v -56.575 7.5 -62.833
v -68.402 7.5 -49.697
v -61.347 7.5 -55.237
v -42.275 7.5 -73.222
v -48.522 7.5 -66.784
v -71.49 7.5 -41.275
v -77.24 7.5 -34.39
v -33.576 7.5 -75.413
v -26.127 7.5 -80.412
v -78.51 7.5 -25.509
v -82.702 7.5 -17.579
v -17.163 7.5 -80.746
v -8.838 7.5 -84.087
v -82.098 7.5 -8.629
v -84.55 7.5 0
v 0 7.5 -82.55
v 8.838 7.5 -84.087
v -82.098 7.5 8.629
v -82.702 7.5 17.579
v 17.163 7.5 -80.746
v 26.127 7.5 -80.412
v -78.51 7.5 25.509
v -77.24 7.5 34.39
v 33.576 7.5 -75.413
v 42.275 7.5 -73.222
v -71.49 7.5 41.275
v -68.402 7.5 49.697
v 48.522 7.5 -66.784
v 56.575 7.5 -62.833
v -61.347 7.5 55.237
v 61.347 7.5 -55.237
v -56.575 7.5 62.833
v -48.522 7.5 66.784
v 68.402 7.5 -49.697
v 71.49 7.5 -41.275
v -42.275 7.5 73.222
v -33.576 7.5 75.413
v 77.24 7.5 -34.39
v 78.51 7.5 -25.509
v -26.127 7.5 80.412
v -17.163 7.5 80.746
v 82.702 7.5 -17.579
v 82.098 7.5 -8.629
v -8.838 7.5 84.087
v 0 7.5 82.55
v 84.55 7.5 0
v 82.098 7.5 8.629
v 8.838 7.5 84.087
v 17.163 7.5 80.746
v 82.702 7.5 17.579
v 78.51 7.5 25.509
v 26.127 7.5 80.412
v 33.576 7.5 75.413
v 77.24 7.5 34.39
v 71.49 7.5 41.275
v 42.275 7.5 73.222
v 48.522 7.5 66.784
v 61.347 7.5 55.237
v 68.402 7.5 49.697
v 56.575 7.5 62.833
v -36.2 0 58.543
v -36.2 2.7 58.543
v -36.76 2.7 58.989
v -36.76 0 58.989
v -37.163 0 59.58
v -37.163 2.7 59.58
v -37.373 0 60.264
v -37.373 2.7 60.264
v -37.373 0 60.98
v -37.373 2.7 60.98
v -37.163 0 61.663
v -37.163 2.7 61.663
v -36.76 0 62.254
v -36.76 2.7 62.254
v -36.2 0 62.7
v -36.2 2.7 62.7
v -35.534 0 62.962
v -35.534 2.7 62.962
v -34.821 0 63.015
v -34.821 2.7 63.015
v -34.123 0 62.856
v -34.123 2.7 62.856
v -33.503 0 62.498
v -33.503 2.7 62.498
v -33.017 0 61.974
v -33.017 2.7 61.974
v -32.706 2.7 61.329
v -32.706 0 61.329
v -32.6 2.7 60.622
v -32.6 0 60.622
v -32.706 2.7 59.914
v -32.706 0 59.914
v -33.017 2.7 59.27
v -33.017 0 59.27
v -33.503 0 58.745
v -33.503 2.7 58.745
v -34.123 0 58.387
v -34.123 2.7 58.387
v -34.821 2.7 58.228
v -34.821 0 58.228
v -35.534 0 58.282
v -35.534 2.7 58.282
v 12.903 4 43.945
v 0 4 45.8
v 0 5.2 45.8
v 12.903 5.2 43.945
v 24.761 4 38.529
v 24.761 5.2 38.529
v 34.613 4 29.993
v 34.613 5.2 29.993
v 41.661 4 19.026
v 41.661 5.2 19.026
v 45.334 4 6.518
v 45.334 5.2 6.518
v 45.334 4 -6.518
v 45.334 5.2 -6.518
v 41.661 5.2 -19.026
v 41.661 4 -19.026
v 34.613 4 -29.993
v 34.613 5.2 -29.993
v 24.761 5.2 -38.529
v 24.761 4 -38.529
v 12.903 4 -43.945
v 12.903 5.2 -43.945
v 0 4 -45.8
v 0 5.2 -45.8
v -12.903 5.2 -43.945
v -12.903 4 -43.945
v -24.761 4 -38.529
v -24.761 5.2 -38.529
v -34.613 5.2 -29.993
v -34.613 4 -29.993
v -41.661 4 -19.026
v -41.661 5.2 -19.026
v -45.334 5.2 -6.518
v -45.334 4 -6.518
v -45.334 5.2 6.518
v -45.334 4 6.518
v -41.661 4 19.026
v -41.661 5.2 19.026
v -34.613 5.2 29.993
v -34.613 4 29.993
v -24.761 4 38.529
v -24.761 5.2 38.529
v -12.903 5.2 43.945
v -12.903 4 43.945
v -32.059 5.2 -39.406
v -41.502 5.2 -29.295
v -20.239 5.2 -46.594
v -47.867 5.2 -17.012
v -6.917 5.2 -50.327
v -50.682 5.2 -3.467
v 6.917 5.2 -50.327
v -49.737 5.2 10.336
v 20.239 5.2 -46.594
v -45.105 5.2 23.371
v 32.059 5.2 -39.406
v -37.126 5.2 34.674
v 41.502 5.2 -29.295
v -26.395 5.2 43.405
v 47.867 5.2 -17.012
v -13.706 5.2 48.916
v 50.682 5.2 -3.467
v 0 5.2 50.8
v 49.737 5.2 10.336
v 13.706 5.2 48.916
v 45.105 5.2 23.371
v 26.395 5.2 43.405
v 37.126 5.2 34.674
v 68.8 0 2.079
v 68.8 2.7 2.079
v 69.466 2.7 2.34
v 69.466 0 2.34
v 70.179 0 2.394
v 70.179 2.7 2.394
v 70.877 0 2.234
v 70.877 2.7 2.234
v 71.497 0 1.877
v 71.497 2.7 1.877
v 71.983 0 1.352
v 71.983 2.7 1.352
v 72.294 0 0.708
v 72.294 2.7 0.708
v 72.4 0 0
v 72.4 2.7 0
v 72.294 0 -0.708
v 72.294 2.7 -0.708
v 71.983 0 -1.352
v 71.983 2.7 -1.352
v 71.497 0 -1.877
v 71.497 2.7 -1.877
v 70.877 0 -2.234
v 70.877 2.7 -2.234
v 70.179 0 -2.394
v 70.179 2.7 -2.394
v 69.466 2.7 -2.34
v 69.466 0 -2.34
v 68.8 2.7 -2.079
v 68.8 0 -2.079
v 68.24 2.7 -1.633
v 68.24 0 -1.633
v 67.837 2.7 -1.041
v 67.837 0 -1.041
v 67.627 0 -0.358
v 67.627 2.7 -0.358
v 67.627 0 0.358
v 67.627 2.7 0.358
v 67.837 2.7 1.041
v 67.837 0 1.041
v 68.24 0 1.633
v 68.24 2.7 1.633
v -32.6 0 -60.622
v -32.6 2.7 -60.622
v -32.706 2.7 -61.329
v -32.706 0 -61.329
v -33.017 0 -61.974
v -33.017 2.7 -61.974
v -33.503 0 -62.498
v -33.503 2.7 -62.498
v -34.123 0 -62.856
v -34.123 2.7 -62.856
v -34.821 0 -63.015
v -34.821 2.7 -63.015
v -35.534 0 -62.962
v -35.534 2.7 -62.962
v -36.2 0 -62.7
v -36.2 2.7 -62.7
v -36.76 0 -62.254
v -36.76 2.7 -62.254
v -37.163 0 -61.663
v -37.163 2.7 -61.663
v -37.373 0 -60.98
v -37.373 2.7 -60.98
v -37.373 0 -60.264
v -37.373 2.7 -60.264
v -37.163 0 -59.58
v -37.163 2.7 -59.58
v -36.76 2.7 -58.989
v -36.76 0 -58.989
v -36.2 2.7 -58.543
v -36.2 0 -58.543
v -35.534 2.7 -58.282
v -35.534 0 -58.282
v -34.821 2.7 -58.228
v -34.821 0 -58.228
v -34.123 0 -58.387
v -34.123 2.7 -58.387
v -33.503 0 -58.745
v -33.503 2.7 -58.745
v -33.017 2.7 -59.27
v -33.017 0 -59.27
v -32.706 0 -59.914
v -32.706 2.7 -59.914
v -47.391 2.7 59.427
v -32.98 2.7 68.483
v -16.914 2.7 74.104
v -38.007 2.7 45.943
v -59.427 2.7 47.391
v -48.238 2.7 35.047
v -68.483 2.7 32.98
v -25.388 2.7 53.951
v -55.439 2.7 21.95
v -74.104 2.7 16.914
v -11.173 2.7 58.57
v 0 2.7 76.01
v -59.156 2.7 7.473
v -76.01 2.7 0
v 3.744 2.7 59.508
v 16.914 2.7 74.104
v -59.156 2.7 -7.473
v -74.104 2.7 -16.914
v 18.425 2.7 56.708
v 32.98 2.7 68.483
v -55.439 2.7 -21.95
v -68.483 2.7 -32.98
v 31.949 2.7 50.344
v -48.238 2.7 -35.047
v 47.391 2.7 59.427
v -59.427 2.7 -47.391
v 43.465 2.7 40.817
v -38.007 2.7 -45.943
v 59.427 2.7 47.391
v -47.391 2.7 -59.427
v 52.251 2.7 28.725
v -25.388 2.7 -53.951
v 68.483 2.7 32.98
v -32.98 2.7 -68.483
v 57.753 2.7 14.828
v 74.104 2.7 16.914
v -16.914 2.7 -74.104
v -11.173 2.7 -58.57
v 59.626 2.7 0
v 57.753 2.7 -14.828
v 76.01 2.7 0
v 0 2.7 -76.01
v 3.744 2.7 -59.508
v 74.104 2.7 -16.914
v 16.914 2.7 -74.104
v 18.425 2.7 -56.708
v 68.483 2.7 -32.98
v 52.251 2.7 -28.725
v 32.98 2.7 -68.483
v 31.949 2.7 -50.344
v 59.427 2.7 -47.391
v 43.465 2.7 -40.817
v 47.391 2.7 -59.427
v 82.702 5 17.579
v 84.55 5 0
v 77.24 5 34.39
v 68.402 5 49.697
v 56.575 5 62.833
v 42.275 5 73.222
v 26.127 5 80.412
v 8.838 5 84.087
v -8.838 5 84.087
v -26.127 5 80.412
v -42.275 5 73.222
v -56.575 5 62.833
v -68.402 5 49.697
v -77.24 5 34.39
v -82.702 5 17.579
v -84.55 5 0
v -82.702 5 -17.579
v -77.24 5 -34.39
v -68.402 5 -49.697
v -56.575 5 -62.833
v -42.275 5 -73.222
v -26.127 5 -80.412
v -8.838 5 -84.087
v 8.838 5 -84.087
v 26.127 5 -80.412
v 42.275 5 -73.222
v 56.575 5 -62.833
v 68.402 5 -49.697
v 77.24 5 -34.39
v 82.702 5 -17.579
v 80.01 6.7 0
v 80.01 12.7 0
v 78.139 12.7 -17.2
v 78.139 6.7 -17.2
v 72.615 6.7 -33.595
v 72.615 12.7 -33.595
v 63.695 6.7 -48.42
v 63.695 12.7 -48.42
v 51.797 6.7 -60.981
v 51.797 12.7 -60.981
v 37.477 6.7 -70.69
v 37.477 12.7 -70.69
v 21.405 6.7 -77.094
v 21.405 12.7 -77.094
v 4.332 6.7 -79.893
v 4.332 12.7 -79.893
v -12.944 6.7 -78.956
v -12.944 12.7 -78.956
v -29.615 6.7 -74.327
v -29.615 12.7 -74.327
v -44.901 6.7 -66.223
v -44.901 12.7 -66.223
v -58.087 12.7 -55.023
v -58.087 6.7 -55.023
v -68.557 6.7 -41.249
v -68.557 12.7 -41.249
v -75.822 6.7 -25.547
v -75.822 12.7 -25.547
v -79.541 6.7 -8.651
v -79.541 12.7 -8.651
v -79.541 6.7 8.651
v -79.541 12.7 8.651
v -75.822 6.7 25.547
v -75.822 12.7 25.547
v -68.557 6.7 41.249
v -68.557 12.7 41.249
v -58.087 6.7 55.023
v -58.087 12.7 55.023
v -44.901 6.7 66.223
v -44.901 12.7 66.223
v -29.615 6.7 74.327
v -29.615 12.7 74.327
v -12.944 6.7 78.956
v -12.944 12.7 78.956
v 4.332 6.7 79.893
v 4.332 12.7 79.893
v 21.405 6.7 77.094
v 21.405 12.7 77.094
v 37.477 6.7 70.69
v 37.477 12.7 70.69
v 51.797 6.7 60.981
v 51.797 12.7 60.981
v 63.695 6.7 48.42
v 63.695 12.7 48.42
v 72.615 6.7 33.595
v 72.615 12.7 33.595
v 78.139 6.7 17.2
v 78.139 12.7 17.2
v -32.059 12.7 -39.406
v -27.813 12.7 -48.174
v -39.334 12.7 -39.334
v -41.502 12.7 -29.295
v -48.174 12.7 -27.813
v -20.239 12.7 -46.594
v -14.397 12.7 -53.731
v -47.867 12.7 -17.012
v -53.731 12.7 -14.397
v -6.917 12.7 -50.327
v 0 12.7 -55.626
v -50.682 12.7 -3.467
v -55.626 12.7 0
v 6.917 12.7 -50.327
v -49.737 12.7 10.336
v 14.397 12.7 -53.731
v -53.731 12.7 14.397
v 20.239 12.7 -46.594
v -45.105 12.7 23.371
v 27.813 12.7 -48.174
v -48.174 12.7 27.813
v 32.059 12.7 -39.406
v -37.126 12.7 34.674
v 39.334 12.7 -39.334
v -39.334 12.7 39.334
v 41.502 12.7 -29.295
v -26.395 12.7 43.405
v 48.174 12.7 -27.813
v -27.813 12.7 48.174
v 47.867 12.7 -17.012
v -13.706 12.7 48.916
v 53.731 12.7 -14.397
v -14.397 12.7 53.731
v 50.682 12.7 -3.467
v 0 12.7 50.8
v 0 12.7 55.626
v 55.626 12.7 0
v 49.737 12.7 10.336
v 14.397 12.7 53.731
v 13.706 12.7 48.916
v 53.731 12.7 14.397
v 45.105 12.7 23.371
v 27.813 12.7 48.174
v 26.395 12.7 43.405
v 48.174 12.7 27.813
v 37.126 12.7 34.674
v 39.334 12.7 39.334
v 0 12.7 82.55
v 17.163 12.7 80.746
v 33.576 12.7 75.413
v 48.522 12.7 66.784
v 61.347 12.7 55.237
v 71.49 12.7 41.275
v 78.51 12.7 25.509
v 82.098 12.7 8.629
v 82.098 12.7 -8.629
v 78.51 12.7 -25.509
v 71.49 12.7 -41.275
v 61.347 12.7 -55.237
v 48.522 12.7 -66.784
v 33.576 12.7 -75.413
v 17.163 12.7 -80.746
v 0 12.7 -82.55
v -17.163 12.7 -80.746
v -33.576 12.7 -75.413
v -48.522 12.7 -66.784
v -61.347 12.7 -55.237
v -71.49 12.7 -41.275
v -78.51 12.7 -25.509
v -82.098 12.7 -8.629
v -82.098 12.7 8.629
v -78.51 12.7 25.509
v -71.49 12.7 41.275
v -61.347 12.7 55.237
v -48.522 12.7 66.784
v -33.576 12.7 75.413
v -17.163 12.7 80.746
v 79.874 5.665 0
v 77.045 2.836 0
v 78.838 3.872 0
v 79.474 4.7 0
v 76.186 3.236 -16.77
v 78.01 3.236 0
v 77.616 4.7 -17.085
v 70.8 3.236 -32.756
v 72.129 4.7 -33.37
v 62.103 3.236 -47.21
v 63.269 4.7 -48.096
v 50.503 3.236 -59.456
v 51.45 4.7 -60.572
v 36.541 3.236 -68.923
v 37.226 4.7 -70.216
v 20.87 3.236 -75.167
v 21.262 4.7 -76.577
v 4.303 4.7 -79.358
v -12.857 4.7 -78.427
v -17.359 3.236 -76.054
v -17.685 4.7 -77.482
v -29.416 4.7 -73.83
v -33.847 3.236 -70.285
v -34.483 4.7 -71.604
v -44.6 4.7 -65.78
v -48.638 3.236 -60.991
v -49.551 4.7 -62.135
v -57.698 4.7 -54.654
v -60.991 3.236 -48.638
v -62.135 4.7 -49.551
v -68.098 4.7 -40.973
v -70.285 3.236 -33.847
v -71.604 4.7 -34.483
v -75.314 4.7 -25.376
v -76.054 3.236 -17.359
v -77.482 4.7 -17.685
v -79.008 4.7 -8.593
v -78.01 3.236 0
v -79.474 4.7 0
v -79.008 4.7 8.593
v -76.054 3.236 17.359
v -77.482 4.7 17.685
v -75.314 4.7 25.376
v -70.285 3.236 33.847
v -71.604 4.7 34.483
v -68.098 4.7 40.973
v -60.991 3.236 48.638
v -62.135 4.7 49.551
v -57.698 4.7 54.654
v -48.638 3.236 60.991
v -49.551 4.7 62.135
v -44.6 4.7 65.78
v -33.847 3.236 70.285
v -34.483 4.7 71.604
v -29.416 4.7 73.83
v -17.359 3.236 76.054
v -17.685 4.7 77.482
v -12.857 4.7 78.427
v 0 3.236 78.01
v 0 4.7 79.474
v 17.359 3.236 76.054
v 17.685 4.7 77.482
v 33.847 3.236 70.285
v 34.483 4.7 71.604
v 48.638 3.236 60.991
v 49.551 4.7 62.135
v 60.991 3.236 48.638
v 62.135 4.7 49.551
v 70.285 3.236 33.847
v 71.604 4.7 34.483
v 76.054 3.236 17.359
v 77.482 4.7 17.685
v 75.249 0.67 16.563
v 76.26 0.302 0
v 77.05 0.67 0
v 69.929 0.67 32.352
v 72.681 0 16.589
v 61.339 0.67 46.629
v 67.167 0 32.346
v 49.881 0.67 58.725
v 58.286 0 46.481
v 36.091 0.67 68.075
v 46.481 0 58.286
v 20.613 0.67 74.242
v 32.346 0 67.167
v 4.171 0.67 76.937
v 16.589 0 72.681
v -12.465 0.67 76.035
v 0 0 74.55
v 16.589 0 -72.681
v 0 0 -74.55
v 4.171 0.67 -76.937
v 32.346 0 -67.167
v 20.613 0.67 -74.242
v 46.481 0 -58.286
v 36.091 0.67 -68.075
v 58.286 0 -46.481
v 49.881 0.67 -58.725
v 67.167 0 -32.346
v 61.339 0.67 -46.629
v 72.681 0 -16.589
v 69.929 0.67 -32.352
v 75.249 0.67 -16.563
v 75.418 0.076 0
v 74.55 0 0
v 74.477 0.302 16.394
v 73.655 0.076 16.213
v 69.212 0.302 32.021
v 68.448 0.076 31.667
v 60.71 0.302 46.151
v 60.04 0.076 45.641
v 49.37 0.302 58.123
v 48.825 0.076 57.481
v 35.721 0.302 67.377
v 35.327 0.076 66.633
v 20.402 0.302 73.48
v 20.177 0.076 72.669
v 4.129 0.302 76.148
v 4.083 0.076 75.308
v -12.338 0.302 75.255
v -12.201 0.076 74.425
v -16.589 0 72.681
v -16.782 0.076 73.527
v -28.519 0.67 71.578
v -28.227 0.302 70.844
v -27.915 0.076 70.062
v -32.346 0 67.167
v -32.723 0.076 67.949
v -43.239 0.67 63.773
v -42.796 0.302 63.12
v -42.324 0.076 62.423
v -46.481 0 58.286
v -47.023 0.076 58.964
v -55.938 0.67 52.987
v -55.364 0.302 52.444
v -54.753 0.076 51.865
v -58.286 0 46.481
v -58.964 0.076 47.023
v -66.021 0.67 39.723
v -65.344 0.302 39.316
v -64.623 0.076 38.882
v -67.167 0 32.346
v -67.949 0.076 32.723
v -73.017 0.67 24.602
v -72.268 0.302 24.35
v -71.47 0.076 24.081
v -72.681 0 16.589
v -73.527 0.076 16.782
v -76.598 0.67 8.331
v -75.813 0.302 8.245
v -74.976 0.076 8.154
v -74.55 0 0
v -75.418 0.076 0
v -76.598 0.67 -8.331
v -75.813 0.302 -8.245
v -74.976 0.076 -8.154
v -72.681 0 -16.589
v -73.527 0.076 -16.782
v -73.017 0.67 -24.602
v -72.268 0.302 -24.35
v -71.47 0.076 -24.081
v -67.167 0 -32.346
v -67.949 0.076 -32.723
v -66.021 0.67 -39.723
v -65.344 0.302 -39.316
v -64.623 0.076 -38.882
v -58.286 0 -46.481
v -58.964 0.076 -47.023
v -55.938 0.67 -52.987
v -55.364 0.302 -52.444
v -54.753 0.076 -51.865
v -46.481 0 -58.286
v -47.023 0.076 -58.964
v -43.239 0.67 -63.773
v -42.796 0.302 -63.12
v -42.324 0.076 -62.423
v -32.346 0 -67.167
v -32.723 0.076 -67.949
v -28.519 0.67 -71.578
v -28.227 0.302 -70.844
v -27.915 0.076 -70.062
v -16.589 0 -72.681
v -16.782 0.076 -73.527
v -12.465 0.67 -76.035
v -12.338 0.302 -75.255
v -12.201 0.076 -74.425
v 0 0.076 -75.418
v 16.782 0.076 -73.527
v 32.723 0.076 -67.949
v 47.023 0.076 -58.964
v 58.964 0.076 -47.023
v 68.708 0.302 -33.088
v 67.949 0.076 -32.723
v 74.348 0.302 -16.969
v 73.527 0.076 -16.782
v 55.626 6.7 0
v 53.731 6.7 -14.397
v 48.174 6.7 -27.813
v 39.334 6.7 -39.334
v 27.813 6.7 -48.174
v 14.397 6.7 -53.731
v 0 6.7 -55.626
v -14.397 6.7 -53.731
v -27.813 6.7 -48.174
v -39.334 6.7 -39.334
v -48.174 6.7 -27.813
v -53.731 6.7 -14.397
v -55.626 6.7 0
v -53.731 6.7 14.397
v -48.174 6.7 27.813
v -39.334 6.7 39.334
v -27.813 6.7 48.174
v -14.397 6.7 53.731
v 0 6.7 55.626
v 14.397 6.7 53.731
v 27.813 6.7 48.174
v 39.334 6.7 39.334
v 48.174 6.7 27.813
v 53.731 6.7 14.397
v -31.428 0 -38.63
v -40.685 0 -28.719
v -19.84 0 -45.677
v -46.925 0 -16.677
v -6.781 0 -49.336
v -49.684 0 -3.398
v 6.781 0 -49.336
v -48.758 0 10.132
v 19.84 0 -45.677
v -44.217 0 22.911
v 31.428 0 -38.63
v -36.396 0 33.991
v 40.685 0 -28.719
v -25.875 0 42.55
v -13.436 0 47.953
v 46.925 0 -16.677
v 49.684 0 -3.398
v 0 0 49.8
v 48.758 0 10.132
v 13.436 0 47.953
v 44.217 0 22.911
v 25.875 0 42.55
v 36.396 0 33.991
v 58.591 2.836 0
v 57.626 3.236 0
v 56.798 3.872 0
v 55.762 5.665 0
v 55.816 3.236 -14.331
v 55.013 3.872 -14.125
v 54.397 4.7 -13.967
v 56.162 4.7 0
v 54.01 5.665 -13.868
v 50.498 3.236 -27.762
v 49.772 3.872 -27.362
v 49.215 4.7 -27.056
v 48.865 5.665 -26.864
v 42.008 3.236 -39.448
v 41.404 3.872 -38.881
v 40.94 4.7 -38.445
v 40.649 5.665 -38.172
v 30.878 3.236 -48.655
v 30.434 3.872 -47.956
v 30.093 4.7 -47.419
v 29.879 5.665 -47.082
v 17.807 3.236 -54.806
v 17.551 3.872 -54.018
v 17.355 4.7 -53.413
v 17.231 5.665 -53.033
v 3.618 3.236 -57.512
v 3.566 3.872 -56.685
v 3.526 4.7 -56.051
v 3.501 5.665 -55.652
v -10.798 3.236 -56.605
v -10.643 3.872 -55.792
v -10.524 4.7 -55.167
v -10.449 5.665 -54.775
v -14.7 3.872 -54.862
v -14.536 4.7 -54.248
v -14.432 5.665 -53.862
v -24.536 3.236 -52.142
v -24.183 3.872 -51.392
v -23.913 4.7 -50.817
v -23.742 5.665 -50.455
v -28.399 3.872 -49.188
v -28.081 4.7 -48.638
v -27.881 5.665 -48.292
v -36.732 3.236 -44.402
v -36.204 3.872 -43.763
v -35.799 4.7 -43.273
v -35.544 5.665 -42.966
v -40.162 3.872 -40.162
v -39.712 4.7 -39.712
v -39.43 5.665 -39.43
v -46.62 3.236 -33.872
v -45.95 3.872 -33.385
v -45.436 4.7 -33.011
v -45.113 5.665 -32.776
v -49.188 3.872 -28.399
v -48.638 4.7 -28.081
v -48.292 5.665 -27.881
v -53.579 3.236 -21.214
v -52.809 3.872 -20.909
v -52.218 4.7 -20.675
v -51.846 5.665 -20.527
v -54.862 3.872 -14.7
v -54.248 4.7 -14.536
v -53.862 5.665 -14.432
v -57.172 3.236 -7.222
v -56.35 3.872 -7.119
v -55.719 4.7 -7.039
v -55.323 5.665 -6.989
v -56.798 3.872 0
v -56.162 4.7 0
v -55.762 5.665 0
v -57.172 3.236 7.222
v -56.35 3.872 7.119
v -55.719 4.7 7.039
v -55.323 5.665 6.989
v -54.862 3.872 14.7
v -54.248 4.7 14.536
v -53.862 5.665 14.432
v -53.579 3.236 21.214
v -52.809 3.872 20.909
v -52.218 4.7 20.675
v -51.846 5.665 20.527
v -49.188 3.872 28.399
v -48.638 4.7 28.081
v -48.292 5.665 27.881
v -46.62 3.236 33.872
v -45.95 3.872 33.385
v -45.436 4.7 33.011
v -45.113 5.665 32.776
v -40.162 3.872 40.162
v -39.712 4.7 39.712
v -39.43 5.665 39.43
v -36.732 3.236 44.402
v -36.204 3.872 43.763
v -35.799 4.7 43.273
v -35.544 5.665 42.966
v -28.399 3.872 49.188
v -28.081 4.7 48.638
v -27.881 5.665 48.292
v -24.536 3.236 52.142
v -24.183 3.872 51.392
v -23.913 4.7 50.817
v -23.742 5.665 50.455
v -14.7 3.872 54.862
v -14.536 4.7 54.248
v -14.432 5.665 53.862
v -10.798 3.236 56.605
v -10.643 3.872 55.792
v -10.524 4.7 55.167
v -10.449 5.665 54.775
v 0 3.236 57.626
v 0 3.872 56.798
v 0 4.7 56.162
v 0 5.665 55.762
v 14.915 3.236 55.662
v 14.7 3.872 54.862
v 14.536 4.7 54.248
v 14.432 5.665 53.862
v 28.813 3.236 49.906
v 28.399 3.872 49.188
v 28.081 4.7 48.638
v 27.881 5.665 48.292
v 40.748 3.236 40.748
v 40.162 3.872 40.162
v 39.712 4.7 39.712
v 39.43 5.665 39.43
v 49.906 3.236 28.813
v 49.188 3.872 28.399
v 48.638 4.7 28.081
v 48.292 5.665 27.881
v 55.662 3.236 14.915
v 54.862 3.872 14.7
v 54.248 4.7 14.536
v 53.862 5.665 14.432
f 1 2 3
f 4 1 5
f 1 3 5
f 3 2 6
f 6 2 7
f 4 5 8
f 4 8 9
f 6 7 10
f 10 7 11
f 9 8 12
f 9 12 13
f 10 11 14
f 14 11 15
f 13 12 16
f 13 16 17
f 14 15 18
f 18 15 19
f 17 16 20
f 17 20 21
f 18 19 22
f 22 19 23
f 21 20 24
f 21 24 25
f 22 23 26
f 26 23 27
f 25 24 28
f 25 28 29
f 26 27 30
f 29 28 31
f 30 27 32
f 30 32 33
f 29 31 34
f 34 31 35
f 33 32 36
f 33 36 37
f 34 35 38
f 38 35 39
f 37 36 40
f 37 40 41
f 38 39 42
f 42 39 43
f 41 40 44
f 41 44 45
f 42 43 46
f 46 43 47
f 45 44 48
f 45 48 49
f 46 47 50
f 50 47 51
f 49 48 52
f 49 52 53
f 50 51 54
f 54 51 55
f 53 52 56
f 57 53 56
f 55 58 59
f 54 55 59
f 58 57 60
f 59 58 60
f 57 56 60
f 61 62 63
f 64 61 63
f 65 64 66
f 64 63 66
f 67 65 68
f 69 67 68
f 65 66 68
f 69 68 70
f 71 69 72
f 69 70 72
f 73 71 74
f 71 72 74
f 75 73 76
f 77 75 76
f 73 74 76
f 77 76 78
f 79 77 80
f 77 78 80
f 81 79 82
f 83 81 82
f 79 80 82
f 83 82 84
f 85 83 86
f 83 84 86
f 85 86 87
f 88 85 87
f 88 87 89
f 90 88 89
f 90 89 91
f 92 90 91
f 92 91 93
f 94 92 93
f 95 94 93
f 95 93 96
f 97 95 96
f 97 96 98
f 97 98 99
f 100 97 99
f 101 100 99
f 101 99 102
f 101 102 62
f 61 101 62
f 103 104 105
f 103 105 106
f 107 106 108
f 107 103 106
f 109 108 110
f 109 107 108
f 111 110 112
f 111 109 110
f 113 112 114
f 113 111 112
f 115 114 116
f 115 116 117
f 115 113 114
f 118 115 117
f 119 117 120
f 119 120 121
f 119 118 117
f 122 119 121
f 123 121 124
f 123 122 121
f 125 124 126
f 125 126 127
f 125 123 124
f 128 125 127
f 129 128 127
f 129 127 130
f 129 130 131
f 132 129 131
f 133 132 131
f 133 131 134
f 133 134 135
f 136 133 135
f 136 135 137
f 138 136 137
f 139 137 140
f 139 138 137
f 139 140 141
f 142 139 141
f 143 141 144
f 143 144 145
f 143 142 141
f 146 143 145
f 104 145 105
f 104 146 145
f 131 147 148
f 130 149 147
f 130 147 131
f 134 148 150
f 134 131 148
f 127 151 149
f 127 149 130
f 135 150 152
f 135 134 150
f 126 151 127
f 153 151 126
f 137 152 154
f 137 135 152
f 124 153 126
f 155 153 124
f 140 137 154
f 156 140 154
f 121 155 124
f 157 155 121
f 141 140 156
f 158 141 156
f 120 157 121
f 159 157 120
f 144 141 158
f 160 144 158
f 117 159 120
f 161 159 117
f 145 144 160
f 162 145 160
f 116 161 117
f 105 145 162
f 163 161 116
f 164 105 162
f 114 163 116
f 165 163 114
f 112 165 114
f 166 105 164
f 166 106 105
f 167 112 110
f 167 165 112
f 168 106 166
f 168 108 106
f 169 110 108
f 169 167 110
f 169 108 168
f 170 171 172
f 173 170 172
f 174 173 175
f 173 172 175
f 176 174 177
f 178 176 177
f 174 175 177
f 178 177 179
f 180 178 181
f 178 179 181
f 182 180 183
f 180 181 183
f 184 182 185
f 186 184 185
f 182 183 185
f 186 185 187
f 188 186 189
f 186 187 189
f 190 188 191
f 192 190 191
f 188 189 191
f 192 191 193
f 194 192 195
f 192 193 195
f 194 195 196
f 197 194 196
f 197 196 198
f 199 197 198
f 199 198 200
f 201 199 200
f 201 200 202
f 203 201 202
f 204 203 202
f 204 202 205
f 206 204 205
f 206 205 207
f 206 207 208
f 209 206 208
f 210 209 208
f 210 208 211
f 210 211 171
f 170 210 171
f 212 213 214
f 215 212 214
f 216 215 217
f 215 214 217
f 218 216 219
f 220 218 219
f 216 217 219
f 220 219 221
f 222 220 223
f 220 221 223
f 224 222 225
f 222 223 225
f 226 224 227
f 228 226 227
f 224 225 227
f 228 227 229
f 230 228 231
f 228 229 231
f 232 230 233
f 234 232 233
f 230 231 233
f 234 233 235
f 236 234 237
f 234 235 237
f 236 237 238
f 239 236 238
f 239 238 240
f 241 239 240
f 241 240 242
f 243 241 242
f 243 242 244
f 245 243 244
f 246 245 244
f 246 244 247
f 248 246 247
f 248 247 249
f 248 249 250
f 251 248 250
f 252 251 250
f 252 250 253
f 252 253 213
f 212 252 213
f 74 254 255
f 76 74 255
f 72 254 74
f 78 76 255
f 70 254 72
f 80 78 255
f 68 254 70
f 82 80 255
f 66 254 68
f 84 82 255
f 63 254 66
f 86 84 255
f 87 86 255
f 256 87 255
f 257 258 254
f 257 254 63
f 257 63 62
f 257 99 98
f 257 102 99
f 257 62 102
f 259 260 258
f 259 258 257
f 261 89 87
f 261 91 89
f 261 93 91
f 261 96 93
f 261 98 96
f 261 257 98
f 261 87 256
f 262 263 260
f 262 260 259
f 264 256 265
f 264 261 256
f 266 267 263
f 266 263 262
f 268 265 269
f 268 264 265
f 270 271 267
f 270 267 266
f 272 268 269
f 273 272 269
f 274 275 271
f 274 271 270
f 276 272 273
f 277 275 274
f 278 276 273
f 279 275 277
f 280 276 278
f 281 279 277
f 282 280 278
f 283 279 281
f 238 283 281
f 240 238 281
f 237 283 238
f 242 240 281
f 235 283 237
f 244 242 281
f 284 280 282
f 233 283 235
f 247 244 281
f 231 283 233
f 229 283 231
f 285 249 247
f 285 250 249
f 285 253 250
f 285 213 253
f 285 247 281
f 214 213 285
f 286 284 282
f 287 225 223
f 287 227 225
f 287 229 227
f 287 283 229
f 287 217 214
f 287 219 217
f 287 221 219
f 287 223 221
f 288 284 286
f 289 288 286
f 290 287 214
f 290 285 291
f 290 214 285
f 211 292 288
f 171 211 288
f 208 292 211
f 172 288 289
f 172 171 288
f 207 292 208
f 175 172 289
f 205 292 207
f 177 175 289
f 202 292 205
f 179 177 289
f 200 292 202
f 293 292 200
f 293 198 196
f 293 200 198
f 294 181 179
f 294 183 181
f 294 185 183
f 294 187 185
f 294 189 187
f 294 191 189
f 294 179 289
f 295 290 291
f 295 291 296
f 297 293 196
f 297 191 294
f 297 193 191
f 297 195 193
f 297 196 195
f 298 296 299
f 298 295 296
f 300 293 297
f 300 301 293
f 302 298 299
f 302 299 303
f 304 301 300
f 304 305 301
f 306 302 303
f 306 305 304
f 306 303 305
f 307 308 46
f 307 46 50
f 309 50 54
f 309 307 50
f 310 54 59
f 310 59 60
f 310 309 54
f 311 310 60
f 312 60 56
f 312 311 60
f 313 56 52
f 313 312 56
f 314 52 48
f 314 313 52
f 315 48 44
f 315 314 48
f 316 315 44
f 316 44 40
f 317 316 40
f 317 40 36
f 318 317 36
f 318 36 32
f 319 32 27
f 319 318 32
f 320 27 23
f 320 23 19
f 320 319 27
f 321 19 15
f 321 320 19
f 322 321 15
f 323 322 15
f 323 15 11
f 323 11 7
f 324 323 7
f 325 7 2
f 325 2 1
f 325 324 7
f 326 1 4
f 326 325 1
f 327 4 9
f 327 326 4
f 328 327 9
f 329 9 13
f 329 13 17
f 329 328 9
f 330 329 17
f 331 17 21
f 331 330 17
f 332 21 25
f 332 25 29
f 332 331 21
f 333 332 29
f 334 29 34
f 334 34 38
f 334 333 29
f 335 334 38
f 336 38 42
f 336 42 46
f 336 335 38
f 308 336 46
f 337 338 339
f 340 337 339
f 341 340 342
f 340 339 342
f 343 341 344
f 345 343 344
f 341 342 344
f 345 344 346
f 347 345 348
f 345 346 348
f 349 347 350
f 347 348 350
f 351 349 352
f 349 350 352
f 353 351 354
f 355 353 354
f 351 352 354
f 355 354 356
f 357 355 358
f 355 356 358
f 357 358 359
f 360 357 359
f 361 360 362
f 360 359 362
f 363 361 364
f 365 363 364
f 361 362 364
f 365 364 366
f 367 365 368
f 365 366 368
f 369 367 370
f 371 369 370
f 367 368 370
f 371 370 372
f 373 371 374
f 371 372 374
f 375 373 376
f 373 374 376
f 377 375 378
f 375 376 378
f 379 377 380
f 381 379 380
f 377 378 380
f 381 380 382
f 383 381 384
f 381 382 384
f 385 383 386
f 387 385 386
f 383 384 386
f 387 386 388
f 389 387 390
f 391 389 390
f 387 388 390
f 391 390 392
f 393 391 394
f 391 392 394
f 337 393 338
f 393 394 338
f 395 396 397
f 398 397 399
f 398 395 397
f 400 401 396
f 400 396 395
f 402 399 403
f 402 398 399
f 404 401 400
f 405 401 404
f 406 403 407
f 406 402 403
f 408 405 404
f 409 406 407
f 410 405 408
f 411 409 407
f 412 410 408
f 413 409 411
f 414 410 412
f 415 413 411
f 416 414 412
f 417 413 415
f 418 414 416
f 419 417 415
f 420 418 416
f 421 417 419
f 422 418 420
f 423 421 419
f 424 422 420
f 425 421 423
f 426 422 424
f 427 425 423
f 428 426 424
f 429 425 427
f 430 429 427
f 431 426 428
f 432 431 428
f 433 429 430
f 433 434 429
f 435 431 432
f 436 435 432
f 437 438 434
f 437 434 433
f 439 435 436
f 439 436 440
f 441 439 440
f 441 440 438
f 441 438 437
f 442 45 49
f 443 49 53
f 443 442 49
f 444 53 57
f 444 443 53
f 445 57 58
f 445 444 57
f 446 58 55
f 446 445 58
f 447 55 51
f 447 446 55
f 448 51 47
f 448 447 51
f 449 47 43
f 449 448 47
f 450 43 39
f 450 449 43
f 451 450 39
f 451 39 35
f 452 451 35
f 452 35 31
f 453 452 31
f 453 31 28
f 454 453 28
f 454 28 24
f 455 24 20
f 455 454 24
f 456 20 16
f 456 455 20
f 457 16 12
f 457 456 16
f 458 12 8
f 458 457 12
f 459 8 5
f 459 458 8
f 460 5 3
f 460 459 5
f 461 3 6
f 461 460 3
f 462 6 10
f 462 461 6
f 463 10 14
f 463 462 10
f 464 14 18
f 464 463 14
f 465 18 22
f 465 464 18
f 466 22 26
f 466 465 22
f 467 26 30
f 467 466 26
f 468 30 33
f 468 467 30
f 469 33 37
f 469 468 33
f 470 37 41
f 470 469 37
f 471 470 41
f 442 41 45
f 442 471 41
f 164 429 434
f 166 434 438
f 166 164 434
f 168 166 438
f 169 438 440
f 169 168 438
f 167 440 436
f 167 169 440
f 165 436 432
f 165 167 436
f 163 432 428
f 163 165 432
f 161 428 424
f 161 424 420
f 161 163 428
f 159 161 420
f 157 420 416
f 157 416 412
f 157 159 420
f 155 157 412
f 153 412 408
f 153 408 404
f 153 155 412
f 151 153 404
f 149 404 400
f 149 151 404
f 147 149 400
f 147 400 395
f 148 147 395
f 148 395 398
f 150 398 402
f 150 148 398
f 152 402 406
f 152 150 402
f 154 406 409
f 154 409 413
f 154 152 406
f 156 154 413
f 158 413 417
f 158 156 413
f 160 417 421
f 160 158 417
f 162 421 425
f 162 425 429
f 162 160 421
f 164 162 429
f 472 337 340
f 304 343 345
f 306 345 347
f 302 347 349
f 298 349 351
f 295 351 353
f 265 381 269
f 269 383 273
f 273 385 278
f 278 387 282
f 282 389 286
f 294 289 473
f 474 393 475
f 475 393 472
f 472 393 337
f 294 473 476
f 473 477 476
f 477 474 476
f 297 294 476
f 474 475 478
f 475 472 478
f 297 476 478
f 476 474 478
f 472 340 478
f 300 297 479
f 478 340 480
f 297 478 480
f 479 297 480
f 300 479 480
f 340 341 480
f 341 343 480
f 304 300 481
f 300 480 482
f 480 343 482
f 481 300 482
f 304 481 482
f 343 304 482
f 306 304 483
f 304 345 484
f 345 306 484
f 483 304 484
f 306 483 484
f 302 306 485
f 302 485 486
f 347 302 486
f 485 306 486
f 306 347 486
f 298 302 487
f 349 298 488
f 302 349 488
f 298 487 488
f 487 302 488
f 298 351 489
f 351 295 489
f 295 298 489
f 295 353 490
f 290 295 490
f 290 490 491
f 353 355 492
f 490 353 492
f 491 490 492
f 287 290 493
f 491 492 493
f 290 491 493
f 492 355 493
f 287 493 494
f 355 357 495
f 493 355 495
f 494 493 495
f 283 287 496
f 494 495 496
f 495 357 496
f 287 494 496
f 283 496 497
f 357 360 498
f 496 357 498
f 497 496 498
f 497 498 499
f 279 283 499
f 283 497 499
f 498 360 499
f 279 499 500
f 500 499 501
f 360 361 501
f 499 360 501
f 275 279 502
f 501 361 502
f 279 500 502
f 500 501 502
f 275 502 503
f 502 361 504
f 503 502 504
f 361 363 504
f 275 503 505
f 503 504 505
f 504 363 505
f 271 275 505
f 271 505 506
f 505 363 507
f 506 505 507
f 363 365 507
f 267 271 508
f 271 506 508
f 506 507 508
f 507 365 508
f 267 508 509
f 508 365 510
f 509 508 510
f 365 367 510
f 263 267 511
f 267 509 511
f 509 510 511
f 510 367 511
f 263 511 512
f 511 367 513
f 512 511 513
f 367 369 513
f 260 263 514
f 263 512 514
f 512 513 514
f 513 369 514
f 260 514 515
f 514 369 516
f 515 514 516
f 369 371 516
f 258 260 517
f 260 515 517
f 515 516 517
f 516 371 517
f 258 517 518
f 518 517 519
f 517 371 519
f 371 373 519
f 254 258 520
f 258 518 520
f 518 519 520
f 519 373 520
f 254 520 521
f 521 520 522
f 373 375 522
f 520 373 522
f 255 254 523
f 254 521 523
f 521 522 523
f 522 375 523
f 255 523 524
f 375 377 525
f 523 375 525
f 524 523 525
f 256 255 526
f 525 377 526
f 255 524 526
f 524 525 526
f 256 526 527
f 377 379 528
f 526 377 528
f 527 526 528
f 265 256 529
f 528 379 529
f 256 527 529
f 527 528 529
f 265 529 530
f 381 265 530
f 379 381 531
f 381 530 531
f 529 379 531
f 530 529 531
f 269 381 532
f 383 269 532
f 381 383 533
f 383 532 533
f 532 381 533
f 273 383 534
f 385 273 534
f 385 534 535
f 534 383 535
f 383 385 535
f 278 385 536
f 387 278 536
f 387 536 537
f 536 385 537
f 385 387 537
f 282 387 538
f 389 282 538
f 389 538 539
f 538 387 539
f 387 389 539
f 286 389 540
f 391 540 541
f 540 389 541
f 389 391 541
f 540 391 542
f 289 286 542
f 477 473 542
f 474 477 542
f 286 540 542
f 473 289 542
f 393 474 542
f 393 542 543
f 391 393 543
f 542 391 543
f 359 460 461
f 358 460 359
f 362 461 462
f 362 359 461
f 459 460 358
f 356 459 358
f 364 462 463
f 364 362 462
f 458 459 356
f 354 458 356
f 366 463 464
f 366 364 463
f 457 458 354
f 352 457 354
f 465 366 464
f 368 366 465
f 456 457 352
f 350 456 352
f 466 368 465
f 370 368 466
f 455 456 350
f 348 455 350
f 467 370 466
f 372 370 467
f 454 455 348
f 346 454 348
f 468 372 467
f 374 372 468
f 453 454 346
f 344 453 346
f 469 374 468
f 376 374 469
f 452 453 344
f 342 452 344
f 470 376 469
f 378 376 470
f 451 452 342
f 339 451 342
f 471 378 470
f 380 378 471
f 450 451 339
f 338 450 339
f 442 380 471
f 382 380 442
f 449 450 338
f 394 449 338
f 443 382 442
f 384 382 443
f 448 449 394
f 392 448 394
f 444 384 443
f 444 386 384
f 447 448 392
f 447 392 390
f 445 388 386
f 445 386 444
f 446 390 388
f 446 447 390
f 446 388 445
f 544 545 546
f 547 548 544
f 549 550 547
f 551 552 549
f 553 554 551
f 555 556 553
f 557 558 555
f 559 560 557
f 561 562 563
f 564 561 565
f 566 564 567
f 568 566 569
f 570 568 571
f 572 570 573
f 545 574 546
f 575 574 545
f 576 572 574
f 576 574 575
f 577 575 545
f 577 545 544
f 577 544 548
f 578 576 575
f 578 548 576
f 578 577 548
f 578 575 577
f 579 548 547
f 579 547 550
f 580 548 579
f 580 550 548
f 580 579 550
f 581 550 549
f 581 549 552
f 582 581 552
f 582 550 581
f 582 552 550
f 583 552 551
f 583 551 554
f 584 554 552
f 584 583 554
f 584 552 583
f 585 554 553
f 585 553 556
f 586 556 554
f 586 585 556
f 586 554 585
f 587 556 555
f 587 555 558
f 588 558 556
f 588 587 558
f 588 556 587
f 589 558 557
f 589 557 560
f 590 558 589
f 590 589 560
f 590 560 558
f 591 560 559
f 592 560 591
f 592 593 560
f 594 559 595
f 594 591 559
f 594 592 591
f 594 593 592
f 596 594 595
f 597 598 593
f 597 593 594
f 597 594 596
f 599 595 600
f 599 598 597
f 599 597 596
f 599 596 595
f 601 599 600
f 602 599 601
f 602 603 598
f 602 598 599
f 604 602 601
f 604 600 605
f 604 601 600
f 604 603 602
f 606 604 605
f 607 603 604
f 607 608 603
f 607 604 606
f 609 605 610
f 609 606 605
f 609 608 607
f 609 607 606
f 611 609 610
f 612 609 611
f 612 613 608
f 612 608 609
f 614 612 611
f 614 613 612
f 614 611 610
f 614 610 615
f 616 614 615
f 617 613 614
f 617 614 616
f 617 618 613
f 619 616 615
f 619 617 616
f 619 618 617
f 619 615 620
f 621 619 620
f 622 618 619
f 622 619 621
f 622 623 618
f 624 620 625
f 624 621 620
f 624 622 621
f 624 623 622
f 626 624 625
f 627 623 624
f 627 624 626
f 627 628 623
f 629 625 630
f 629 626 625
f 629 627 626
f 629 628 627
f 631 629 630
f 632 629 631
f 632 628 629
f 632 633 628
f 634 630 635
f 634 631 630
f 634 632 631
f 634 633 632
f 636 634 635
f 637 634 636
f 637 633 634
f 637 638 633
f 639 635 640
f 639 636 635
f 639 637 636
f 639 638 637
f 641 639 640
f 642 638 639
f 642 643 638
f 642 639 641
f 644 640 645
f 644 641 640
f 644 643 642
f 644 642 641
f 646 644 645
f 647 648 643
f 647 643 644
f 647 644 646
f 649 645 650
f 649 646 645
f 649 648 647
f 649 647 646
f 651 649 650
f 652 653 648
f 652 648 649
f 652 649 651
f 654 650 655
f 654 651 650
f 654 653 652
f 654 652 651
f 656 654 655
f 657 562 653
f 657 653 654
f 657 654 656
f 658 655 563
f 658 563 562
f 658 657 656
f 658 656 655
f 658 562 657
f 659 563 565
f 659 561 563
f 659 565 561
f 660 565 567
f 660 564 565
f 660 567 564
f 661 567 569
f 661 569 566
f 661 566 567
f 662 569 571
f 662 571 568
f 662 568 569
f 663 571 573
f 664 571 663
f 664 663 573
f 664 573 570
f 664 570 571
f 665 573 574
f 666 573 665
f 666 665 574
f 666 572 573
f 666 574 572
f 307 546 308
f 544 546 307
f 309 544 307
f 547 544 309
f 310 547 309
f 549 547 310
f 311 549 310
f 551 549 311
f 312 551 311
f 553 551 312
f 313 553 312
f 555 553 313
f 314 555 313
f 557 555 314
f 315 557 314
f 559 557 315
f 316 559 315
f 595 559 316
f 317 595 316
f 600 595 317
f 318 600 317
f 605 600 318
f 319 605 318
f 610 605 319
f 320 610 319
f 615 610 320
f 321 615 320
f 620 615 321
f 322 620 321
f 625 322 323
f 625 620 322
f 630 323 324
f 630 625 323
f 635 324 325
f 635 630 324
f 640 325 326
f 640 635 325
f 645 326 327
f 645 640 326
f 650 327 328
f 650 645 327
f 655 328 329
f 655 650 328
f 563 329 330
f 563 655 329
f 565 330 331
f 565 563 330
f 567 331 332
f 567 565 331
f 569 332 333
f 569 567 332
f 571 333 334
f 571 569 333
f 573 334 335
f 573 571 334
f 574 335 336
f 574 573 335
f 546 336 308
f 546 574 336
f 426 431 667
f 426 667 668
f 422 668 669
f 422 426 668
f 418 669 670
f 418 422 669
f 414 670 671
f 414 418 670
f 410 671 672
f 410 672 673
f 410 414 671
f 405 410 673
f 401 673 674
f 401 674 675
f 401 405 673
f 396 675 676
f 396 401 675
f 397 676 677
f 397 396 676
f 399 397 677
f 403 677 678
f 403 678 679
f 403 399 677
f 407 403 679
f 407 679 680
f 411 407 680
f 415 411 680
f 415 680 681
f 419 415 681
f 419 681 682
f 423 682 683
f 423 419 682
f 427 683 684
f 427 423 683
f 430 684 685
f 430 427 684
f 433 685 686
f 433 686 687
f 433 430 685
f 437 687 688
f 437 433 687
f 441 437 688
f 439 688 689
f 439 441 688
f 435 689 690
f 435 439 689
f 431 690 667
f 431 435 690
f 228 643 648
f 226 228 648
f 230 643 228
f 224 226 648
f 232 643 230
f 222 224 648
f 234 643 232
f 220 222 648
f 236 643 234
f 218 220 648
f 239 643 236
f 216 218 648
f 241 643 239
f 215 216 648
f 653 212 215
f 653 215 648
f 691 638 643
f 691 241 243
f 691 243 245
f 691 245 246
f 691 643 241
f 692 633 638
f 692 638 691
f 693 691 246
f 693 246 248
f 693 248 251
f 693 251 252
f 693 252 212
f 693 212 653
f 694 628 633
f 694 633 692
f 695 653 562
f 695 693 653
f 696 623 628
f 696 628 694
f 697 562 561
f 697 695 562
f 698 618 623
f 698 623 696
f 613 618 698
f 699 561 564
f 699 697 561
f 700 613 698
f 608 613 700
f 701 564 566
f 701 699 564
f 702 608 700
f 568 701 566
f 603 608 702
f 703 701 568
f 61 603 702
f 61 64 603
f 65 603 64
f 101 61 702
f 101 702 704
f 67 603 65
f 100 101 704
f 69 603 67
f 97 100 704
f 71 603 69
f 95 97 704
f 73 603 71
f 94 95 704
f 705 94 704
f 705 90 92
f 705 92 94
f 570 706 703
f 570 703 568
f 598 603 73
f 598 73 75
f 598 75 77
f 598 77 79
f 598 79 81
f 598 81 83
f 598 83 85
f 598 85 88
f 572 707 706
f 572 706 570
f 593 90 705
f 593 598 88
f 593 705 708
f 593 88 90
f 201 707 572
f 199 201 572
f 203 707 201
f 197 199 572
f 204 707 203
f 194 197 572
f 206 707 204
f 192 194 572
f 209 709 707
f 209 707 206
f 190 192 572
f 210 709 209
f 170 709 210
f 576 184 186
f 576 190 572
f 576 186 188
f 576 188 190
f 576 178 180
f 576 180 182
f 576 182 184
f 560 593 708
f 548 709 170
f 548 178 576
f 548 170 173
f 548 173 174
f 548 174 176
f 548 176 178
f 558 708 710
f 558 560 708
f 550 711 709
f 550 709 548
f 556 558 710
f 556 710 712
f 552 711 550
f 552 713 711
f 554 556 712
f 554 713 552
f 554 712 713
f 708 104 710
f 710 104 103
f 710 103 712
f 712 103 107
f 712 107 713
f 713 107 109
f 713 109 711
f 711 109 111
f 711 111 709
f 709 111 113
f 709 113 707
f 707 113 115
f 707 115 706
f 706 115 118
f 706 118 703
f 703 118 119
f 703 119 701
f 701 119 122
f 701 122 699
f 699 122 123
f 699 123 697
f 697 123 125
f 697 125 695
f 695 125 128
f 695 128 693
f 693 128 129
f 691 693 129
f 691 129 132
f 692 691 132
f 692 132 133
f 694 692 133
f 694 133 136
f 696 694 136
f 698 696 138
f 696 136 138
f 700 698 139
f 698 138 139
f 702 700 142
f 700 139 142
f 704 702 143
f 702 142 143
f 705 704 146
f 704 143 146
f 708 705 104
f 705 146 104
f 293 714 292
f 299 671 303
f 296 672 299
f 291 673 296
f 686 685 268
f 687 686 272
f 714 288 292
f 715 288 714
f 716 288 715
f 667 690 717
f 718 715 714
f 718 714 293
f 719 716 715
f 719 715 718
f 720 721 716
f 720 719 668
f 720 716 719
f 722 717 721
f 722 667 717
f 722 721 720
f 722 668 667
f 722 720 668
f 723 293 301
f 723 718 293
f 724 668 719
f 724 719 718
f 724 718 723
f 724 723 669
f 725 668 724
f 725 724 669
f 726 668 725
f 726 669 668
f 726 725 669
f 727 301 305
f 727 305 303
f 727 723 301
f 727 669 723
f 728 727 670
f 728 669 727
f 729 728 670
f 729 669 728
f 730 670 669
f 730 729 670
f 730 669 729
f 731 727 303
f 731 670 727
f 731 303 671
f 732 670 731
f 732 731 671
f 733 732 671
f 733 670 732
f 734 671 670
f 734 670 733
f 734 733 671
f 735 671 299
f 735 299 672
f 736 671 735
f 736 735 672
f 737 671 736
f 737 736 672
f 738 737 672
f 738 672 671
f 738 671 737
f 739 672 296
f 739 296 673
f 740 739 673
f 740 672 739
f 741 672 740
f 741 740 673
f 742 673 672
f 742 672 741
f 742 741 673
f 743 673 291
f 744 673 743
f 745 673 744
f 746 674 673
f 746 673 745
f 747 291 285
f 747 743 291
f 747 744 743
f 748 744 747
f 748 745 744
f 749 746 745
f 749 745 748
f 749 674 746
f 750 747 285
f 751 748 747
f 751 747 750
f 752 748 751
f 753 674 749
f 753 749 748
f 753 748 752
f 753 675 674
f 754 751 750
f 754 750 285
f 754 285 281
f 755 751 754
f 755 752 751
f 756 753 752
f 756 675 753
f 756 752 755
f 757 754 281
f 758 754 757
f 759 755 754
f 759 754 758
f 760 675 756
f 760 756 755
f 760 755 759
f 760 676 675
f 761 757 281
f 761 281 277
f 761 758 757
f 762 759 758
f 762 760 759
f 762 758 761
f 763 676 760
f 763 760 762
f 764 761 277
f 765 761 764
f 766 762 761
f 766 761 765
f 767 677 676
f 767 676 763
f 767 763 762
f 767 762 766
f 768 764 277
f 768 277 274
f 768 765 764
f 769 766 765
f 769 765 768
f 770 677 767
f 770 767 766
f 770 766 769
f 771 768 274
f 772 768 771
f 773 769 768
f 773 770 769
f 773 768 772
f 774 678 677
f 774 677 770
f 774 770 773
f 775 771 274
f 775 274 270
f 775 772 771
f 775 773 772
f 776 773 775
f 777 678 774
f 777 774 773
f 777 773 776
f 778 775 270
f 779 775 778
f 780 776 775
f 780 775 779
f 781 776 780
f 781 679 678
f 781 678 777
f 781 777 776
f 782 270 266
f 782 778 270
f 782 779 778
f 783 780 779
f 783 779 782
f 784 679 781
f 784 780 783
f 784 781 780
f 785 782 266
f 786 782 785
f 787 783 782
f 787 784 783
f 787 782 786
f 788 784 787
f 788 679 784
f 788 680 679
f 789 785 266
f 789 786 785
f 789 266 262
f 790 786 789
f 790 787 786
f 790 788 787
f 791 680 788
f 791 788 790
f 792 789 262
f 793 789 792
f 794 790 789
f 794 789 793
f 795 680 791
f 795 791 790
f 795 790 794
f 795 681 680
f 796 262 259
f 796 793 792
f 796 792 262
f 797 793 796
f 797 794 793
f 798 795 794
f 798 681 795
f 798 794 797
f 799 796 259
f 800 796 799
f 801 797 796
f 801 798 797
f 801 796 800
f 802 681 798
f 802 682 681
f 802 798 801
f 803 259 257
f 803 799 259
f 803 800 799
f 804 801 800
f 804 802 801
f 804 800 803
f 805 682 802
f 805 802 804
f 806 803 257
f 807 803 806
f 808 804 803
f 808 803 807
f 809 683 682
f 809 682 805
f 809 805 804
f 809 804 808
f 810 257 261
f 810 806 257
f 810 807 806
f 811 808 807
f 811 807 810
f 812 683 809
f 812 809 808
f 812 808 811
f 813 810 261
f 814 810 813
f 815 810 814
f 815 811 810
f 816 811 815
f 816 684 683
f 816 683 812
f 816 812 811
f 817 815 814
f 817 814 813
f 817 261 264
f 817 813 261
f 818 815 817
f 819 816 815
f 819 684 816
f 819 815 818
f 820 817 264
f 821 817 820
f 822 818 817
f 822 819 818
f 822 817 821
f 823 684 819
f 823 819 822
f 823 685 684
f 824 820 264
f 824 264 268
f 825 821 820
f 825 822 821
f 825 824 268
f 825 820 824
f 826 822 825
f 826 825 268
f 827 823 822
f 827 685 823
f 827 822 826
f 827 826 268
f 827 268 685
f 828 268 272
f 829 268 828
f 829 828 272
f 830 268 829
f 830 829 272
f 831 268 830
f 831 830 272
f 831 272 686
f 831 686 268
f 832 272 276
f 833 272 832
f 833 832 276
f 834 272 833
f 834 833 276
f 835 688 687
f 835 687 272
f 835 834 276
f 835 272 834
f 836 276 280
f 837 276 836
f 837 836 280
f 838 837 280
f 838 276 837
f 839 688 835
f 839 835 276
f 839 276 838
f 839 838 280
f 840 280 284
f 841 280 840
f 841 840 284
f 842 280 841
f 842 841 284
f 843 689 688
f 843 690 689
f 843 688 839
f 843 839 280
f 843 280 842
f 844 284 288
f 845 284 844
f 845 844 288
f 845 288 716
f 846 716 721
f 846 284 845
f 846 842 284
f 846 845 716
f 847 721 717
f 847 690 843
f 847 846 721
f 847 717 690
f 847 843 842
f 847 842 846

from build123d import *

# Parameters (mm, degrees)
F_90_0_0087_DIAMETER_HOLE1_D = 0.22098
CIRPATTERN3_COUNT            = 3
SKETCH8_R                    = 80.01
SKETCH8_R_2                  = 55.626
CUT_EXTRUDE1_DEPTH           = 10
FILLET5_R                    = 4
CHAMFER1_SIZE                = 4
SKETCH10_R                   = 84.55
SKETCH10_R_2                 = 82.55
BOSS_EXTRUDE1_DEPTH          = 7.5
CHAMFER3_SIZE                = 5
CHAMFER3_SIZE2               = 8.660254038
FILLET4_R                    = 5
F_12_0_189_DIAMETER_HOLE1_D  = 4.8006
CIRPATTERN5_COUNT            = 3


with BuildPart() as part:
    # Sketch2 → Revolve1 (revolve)
    with BuildSketch(Plane(origin=(0, 0, 0), x_dir=(0, 0, -1), z_dir=(1, 0, 0))):
        Polygon((-45.8, 0), (-82.55, 0), (-82.55, 12.7), (-50.8, 12.7), (-50.8, 5.2), (-45.8, 5.2), align=None)
    revolve(axis=Axis((0, -0.635, 0), (0, 1, 0)))

    # #90 (0.0087) Diameter Hole1 (through all)
    with Locations(Plane(origin=(0, 12.7, 0), x_dir=(1, 0, 0), z_dir=(0, 1, 0))):
        with Locations((-35, 60.621778265)):
            f_90_0_0087_diameter_hole1 = Hole(F_90_0_0087_DIAMETER_HOLE1_D / 2)

    # CirPattern3: #90 (0.0087) Diameter Hole1 ×3 about axis
    cirpattern3_axis = Axis((0, 0, 0), (0, 1, 0))
    for i in range(1, CIRPATTERN3_COUNT):
        add(f_90_0_0087_diameter_hole1.rotate(cirpattern3_axis, i * 360 / CIRPATTERN3_COUNT), mode=Mode.SUBTRACT)

    # Sketch8 → Cut-Extrude1 (cut)
    with BuildSketch(Plane(origin=(0, 12.7, 0), x_dir=(1, 0, 0), z_dir=(0, 1, 0))):
        Circle(SKETCH8_R)
        Circle(SKETCH8_R_2, mode=Mode.SUBTRACT)
    extrude(amount=-CUT_EXTRUDE1_DEPTH, mode=Mode.SUBTRACT)

    # Fillet5
    fillet5_edges = [part.edges().sort_by_distance(p)[0] for p in [
        (-55.626, 2.7, 0),
        (-80.01, 2.7, 0),
    ]]
    fillet(fillet5_edges, radius=FILLET5_R)

    # Chamfer1
    chamfer1_edges = [part.edges().sort_by_distance(p)[0] for p in [
        (0, 0, -45.8),
    ]]
    chamfer(chamfer1_edges, length=CHAMFER1_SIZE)

    # Sketch10 → Boss-Extrude1 (add)
    with BuildSketch(Plane.XZ):
        Circle(SKETCH10_R)
        Circle(SKETCH10_R_2, mode=Mode.SUBTRACT)
    extrude(amount=-BOSS_EXTRUDE1_DEPTH)

    # Chamfer3
    chamfer3_edges = [part.edges().sort_by_distance(p)[0] for p in [
        (-84.55, 0, 0),
    ]]
    chamfer3_side = [part.faces().sort_by_distance(p)[0] for p in [
        (-84.55, 3.75, 0),
    ]]
    chamfer(chamfer3_edges, length=CHAMFER3_SIZE, length2=CHAMFER3_SIZE2, reference=chamfer3_side[0])

    # Fillet4
    fillet4_edges = [part.edges().sort_by_distance(p)[0] for p in [
        (-75.889745962, 0, 0),
    ]]
    fillet(fillet4_edges, radius=FILLET4_R)

    # #12 (0.189) Diameter Hole1 (through all)
    with Locations(Plane(origin=(0, 0, 0), x_dir=(-1, 0, 0), z_dir=(0, -1, 0))):
        with Locations((35, 60.621778265)):
            f_12_0_189_diameter_hole1 = Hole(F_12_0_189_DIAMETER_HOLE1_D / 2)

    # CirPattern5: #12 (0.189) Diameter Hole1 ×3 about axis
    cirpattern5_axis = Axis((0, 0, 0), (0, 1, 0))
    for i in range(1, CIRPATTERN5_COUNT):
        add(f_12_0_189_diameter_hole1.rotate(cirpattern5_axis, i * 360 / CIRPATTERN5_COUNT), mode=Mode.SUBTRACT)


solid = part.part
